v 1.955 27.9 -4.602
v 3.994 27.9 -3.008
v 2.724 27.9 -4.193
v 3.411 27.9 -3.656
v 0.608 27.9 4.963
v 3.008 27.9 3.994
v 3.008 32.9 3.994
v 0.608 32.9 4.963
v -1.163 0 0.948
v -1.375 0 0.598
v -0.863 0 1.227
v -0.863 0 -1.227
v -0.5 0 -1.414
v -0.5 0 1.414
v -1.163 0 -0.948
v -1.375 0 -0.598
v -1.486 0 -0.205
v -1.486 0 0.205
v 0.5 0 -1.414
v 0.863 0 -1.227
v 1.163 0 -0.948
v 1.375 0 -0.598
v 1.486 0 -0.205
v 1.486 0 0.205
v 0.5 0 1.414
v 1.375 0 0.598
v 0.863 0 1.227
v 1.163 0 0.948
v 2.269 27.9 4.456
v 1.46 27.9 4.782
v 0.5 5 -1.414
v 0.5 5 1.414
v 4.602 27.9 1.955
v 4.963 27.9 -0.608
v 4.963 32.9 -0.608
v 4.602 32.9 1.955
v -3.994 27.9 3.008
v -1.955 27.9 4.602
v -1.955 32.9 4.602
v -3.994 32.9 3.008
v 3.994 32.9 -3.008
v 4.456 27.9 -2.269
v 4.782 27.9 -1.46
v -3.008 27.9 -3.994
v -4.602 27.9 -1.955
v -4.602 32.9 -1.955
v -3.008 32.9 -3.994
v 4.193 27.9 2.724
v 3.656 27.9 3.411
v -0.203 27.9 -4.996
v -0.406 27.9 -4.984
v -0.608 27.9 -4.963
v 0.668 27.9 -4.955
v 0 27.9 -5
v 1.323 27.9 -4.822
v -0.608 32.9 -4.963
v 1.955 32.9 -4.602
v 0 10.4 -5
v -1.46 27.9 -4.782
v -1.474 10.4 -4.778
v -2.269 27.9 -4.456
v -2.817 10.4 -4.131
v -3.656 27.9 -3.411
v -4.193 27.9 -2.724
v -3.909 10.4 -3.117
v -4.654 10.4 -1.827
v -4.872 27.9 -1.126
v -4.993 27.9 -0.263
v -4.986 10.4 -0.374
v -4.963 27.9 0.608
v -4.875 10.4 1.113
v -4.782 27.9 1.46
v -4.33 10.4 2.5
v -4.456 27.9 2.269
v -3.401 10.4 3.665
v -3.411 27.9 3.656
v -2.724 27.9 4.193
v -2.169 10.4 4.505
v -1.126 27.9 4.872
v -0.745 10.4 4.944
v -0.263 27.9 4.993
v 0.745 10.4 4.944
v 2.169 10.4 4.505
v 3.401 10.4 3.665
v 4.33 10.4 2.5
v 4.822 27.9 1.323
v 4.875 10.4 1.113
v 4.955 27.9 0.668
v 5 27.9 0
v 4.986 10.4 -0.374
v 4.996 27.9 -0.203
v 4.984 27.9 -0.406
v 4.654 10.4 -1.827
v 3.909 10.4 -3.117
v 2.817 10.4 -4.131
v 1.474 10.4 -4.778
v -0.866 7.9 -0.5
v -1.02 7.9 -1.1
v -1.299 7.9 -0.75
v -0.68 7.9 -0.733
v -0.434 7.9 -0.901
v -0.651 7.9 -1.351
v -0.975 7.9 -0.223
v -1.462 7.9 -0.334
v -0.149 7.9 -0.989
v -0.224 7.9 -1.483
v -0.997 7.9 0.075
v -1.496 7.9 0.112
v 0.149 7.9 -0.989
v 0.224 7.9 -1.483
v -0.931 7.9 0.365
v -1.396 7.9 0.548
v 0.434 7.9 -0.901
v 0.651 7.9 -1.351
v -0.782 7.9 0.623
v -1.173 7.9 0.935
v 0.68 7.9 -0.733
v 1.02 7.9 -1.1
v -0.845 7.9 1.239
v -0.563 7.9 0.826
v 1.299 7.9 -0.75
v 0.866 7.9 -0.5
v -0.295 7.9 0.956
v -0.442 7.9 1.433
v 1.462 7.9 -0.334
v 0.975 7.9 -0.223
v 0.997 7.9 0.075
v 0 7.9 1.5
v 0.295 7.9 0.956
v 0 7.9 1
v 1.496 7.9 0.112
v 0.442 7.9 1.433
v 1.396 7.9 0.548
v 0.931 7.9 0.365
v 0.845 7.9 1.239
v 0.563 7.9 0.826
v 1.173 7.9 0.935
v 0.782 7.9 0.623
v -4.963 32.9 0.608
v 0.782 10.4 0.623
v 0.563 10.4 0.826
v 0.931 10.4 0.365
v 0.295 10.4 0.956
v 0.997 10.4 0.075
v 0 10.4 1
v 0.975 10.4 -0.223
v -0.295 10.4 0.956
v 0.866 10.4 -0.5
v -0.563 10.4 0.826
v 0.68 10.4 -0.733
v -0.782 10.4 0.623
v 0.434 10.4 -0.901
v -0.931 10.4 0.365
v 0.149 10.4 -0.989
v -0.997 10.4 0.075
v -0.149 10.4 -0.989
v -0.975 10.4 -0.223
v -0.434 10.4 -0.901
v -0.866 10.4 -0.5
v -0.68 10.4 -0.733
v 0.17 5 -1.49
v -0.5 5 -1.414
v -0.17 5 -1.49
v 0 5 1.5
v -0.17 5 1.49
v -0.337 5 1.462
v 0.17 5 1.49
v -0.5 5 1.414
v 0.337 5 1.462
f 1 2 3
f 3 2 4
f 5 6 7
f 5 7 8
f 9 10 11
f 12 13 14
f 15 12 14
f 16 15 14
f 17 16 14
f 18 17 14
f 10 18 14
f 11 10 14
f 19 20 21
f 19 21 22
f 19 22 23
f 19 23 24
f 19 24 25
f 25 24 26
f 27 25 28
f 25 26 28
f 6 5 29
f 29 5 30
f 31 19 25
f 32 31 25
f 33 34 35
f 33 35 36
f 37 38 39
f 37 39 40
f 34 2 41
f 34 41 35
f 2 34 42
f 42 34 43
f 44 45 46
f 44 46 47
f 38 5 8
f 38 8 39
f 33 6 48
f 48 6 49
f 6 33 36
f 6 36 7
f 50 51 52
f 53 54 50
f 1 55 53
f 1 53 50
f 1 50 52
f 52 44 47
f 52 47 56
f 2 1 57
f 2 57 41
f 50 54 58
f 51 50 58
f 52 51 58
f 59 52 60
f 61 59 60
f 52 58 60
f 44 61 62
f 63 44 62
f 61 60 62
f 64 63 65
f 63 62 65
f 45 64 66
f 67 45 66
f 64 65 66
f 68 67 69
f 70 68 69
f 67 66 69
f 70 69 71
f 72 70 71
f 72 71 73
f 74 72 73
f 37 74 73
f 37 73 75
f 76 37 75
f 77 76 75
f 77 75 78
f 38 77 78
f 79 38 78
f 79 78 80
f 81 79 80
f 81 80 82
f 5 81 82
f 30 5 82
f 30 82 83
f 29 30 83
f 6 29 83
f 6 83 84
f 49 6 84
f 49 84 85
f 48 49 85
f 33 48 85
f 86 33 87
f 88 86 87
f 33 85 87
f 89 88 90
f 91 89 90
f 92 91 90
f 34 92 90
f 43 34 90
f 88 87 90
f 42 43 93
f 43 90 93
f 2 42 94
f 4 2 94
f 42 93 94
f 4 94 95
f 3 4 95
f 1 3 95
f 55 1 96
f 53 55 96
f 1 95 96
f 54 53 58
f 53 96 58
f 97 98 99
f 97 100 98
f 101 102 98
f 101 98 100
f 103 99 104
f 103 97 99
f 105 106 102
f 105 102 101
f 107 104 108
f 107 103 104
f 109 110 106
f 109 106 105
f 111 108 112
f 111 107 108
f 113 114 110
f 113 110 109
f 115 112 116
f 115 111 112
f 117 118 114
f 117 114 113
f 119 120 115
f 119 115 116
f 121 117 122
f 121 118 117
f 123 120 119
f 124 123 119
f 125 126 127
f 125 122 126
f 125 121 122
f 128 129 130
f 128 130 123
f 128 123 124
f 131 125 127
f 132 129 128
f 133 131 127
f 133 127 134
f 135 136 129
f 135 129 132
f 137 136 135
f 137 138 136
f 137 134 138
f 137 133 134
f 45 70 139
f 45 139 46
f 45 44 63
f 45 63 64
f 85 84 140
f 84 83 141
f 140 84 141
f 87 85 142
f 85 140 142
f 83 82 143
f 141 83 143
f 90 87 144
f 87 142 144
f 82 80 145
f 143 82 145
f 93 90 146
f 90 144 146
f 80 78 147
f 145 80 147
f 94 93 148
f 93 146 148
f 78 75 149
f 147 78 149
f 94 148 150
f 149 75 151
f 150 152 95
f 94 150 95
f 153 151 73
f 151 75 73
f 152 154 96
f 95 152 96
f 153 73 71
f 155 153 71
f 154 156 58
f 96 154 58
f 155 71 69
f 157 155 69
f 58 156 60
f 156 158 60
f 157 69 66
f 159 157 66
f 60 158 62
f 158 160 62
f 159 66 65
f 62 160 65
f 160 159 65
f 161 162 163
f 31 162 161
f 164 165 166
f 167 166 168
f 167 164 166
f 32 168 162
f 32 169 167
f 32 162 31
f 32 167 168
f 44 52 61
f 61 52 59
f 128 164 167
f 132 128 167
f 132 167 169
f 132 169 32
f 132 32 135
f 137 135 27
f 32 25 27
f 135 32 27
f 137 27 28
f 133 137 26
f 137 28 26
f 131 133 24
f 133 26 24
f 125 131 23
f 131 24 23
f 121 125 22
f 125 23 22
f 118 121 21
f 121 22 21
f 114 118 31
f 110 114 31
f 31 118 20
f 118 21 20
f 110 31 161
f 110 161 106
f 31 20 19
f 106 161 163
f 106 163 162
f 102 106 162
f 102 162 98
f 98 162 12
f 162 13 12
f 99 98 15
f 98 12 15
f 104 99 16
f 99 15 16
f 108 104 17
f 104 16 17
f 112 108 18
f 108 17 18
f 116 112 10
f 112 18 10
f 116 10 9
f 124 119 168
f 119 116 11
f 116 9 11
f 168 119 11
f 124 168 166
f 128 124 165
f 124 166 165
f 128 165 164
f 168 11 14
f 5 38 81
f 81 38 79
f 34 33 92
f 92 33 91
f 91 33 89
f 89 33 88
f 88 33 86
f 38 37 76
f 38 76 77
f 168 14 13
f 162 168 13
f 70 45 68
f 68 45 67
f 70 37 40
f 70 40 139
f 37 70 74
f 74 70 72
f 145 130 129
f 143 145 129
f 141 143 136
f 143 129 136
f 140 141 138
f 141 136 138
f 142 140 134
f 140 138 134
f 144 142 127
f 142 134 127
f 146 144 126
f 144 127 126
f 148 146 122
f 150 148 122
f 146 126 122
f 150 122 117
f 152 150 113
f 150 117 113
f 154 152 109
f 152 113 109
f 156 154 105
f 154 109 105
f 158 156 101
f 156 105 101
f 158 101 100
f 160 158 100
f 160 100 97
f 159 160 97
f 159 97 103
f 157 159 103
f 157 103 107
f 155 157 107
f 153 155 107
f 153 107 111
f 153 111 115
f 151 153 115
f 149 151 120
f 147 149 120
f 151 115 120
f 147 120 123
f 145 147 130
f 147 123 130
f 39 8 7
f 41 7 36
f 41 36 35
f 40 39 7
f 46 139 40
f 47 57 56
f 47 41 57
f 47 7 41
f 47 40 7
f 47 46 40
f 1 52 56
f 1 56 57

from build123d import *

# Parameters (mm, degrees)
SKETCH_1_R          = 1.5
EXTRUDE_1_DEPTH     = 7.9
CUT_EXTRUDE_1_DEPTH = 5
SKETCH_3_R          = 1
EXTRUDE_2_DEPTH     = 2.5
SKETCH_4_R          = 5
EXTRUDE_3_DEPTH     = 22.5
CUT_EXTRUDE_START   = -5
CUT_EXTRUDE_3_DEPTH = 5


with BuildPart() as part:
    # 草图1 → 凸台-拉伸1 (new body)
    with BuildSketch(Plane(origin=(0, 0, 0), x_dir=(1, 0, 0), z_dir=(0, 1, 0))):
        with Locations(Location((0, 0, 0), (0, 0, 270))):
            Circle(SKETCH_1_R)
    extrude(amount=EXTRUDE_1_DEPTH)

    # 草图2 → 切除-拉伸1 (cut)
    with BuildSketch(Plane.XZ):
        with BuildLine():
            Line((-0.5, 1.414213562), (-0.5, -1.414213562))
            ThreePointArc((-0.5, -1.414213562), (0, -1.5), (0.5, -1.414213562))
            Line((0.5, -1.414213562), (0.5, 1.414213562))
            ThreePointArc((0.5, 1.414213562), (0, 1.5), (-0.5, 1.414213562))
        make_face()
    extrude(amount=-CUT_EXTRUDE_1_DEPTH, mode=Mode.SUBTRACT)

    # 草图3 → 凸台-拉伸2 (add)
    with BuildSketch(Plane(origin=(0, 7.9, 0), x_dir=(1, 0, 0), z_dir=(0, 1, 0))):
        with Locations(Location((0, 0, 0), (0, 0, 270))):
            Circle(SKETCH_3_R)
    extrude(amount=EXTRUDE_2_DEPTH)

    # 草图4 → 凸台-拉伸3 (add)
    with BuildSketch(Plane(origin=(0, 10.4, 0), x_dir=(1, 0, 0), z_dir=(0, 1, 0))):
        with Locations(Location((0, 0, 0), (0, 0, 90))):
            Circle(SKETCH_4_R)
    extrude(amount=EXTRUDE_3_DEPTH)

    # 草图5 → 切除-拉伸3 (cut)
    with BuildSketch(Plane(origin=(0, 32.9, 0), x_dir=(1, 0, 0), z_dir=(0, 1, 0)).offset(CUT_EXTRUDE_START)):
        with BuildLine():
            ThreePointArc((-1.954985899, -4.60195938), (-0.697296637, -4.951139), (0.607912238, -4.96290668))
            Line((0.607912238, -4.96290668), (-1.954985899, -4.60195938))
        make_face()
        with BuildLine():
            ThreePointArc((0.607912238, -4.96290668), (1.871692898, -4.63646047), (3.007920781, -3.994047142))
            Line((3.007920781, -3.994047142), (0.607912238, -4.96290668))
        make_face()
        with BuildLine():
            ThreePointArc((3.007920781, -3.994047142), (3.939163833, -3.079446102), (4.60195938, -1.954985899))
            Line((4.60195938, -1.954985899), (3.007920781, -3.994047142))
        make_face()
        with BuildLine():
            ThreePointArc((5, 0), (4.990718054, 0.304521429), (4.96290668, 0.607912238))
            Line((4.96290668, 0.607912238), (4.60195938, -1.954985899))
            ThreePointArc((4.60195938, -1.954985899), (4.899479406, -0.997547768), (5, 0))
        make_face()
        with BuildLine():
            ThreePointArc((4.96290668, 0.607912238), (4.63646047, 1.871692898), (3.994047142, 3.007920781))
            Line((3.994047142, 3.007920781), (4.96290668, 0.607912238))
        make_face()
        with BuildLine():
            Line((-1.954985899, -4.60195938), (-3.994047142, -3.007920781))
            ThreePointArc((-3.994047142, -3.007920781), (-3.079446102, -3.939163833), (-1.954985899, -4.60195938))
        make_face()
        with BuildLine():
            Line((-3.994047142, -3.007920781), (-4.96290668, -0.607912238))
            ThreePointArc((-4.96290668, -0.607912238), (-4.63646047, -1.871692898), (-3.994047142, -3.007920781))
        make_face()
        with BuildLine():
            Line((-4.96290668, -0.607912238), (-4.60195938, 1.954985899))
            ThreePointArc((-4.60195938, 1.954985899), (-4.951139, 0.697296637), (-4.96290668, -0.607912238))
        make_face()
        with BuildLine():
            Line((-4.60195938, 1.954985899), (-3.007920781, 3.994047142))
            ThreePointArc((-3.007920781, 3.994047142), (-3.939163833, 3.079446102), (-4.60195938, 1.954985899))
        make_face()
        with BuildLine():
            Line((-3.007920781, 3.994047142), (-0.607912238, 4.96290668))
            ThreePointArc((-0.607912238, 4.96290668), (-1.871692898, 4.63646047), (-3.007920781, 3.994047142))
        make_face()
        with BuildLine():
            Line((-0.607912238, 4.96290668), (1.954985899, 4.60195938))
            ThreePointArc((1.954985899, 4.60195938), (0.697296637, 4.951139), (-0.607912238, 4.96290668))
        make_face()
        with BuildLine():
            ThreePointArc((3.994047142, 3.007920781), (3.079446102, 3.939163833), (1.954985899, 4.60195938))
            Line((1.954985899, 4.60195938), (3.994047142, 3.007920781))
        make_face()
    extrude(amount=CUT_EXTRUDE_3_DEPTH, mode=Mode.SUBTRACT)


solid = part.part
